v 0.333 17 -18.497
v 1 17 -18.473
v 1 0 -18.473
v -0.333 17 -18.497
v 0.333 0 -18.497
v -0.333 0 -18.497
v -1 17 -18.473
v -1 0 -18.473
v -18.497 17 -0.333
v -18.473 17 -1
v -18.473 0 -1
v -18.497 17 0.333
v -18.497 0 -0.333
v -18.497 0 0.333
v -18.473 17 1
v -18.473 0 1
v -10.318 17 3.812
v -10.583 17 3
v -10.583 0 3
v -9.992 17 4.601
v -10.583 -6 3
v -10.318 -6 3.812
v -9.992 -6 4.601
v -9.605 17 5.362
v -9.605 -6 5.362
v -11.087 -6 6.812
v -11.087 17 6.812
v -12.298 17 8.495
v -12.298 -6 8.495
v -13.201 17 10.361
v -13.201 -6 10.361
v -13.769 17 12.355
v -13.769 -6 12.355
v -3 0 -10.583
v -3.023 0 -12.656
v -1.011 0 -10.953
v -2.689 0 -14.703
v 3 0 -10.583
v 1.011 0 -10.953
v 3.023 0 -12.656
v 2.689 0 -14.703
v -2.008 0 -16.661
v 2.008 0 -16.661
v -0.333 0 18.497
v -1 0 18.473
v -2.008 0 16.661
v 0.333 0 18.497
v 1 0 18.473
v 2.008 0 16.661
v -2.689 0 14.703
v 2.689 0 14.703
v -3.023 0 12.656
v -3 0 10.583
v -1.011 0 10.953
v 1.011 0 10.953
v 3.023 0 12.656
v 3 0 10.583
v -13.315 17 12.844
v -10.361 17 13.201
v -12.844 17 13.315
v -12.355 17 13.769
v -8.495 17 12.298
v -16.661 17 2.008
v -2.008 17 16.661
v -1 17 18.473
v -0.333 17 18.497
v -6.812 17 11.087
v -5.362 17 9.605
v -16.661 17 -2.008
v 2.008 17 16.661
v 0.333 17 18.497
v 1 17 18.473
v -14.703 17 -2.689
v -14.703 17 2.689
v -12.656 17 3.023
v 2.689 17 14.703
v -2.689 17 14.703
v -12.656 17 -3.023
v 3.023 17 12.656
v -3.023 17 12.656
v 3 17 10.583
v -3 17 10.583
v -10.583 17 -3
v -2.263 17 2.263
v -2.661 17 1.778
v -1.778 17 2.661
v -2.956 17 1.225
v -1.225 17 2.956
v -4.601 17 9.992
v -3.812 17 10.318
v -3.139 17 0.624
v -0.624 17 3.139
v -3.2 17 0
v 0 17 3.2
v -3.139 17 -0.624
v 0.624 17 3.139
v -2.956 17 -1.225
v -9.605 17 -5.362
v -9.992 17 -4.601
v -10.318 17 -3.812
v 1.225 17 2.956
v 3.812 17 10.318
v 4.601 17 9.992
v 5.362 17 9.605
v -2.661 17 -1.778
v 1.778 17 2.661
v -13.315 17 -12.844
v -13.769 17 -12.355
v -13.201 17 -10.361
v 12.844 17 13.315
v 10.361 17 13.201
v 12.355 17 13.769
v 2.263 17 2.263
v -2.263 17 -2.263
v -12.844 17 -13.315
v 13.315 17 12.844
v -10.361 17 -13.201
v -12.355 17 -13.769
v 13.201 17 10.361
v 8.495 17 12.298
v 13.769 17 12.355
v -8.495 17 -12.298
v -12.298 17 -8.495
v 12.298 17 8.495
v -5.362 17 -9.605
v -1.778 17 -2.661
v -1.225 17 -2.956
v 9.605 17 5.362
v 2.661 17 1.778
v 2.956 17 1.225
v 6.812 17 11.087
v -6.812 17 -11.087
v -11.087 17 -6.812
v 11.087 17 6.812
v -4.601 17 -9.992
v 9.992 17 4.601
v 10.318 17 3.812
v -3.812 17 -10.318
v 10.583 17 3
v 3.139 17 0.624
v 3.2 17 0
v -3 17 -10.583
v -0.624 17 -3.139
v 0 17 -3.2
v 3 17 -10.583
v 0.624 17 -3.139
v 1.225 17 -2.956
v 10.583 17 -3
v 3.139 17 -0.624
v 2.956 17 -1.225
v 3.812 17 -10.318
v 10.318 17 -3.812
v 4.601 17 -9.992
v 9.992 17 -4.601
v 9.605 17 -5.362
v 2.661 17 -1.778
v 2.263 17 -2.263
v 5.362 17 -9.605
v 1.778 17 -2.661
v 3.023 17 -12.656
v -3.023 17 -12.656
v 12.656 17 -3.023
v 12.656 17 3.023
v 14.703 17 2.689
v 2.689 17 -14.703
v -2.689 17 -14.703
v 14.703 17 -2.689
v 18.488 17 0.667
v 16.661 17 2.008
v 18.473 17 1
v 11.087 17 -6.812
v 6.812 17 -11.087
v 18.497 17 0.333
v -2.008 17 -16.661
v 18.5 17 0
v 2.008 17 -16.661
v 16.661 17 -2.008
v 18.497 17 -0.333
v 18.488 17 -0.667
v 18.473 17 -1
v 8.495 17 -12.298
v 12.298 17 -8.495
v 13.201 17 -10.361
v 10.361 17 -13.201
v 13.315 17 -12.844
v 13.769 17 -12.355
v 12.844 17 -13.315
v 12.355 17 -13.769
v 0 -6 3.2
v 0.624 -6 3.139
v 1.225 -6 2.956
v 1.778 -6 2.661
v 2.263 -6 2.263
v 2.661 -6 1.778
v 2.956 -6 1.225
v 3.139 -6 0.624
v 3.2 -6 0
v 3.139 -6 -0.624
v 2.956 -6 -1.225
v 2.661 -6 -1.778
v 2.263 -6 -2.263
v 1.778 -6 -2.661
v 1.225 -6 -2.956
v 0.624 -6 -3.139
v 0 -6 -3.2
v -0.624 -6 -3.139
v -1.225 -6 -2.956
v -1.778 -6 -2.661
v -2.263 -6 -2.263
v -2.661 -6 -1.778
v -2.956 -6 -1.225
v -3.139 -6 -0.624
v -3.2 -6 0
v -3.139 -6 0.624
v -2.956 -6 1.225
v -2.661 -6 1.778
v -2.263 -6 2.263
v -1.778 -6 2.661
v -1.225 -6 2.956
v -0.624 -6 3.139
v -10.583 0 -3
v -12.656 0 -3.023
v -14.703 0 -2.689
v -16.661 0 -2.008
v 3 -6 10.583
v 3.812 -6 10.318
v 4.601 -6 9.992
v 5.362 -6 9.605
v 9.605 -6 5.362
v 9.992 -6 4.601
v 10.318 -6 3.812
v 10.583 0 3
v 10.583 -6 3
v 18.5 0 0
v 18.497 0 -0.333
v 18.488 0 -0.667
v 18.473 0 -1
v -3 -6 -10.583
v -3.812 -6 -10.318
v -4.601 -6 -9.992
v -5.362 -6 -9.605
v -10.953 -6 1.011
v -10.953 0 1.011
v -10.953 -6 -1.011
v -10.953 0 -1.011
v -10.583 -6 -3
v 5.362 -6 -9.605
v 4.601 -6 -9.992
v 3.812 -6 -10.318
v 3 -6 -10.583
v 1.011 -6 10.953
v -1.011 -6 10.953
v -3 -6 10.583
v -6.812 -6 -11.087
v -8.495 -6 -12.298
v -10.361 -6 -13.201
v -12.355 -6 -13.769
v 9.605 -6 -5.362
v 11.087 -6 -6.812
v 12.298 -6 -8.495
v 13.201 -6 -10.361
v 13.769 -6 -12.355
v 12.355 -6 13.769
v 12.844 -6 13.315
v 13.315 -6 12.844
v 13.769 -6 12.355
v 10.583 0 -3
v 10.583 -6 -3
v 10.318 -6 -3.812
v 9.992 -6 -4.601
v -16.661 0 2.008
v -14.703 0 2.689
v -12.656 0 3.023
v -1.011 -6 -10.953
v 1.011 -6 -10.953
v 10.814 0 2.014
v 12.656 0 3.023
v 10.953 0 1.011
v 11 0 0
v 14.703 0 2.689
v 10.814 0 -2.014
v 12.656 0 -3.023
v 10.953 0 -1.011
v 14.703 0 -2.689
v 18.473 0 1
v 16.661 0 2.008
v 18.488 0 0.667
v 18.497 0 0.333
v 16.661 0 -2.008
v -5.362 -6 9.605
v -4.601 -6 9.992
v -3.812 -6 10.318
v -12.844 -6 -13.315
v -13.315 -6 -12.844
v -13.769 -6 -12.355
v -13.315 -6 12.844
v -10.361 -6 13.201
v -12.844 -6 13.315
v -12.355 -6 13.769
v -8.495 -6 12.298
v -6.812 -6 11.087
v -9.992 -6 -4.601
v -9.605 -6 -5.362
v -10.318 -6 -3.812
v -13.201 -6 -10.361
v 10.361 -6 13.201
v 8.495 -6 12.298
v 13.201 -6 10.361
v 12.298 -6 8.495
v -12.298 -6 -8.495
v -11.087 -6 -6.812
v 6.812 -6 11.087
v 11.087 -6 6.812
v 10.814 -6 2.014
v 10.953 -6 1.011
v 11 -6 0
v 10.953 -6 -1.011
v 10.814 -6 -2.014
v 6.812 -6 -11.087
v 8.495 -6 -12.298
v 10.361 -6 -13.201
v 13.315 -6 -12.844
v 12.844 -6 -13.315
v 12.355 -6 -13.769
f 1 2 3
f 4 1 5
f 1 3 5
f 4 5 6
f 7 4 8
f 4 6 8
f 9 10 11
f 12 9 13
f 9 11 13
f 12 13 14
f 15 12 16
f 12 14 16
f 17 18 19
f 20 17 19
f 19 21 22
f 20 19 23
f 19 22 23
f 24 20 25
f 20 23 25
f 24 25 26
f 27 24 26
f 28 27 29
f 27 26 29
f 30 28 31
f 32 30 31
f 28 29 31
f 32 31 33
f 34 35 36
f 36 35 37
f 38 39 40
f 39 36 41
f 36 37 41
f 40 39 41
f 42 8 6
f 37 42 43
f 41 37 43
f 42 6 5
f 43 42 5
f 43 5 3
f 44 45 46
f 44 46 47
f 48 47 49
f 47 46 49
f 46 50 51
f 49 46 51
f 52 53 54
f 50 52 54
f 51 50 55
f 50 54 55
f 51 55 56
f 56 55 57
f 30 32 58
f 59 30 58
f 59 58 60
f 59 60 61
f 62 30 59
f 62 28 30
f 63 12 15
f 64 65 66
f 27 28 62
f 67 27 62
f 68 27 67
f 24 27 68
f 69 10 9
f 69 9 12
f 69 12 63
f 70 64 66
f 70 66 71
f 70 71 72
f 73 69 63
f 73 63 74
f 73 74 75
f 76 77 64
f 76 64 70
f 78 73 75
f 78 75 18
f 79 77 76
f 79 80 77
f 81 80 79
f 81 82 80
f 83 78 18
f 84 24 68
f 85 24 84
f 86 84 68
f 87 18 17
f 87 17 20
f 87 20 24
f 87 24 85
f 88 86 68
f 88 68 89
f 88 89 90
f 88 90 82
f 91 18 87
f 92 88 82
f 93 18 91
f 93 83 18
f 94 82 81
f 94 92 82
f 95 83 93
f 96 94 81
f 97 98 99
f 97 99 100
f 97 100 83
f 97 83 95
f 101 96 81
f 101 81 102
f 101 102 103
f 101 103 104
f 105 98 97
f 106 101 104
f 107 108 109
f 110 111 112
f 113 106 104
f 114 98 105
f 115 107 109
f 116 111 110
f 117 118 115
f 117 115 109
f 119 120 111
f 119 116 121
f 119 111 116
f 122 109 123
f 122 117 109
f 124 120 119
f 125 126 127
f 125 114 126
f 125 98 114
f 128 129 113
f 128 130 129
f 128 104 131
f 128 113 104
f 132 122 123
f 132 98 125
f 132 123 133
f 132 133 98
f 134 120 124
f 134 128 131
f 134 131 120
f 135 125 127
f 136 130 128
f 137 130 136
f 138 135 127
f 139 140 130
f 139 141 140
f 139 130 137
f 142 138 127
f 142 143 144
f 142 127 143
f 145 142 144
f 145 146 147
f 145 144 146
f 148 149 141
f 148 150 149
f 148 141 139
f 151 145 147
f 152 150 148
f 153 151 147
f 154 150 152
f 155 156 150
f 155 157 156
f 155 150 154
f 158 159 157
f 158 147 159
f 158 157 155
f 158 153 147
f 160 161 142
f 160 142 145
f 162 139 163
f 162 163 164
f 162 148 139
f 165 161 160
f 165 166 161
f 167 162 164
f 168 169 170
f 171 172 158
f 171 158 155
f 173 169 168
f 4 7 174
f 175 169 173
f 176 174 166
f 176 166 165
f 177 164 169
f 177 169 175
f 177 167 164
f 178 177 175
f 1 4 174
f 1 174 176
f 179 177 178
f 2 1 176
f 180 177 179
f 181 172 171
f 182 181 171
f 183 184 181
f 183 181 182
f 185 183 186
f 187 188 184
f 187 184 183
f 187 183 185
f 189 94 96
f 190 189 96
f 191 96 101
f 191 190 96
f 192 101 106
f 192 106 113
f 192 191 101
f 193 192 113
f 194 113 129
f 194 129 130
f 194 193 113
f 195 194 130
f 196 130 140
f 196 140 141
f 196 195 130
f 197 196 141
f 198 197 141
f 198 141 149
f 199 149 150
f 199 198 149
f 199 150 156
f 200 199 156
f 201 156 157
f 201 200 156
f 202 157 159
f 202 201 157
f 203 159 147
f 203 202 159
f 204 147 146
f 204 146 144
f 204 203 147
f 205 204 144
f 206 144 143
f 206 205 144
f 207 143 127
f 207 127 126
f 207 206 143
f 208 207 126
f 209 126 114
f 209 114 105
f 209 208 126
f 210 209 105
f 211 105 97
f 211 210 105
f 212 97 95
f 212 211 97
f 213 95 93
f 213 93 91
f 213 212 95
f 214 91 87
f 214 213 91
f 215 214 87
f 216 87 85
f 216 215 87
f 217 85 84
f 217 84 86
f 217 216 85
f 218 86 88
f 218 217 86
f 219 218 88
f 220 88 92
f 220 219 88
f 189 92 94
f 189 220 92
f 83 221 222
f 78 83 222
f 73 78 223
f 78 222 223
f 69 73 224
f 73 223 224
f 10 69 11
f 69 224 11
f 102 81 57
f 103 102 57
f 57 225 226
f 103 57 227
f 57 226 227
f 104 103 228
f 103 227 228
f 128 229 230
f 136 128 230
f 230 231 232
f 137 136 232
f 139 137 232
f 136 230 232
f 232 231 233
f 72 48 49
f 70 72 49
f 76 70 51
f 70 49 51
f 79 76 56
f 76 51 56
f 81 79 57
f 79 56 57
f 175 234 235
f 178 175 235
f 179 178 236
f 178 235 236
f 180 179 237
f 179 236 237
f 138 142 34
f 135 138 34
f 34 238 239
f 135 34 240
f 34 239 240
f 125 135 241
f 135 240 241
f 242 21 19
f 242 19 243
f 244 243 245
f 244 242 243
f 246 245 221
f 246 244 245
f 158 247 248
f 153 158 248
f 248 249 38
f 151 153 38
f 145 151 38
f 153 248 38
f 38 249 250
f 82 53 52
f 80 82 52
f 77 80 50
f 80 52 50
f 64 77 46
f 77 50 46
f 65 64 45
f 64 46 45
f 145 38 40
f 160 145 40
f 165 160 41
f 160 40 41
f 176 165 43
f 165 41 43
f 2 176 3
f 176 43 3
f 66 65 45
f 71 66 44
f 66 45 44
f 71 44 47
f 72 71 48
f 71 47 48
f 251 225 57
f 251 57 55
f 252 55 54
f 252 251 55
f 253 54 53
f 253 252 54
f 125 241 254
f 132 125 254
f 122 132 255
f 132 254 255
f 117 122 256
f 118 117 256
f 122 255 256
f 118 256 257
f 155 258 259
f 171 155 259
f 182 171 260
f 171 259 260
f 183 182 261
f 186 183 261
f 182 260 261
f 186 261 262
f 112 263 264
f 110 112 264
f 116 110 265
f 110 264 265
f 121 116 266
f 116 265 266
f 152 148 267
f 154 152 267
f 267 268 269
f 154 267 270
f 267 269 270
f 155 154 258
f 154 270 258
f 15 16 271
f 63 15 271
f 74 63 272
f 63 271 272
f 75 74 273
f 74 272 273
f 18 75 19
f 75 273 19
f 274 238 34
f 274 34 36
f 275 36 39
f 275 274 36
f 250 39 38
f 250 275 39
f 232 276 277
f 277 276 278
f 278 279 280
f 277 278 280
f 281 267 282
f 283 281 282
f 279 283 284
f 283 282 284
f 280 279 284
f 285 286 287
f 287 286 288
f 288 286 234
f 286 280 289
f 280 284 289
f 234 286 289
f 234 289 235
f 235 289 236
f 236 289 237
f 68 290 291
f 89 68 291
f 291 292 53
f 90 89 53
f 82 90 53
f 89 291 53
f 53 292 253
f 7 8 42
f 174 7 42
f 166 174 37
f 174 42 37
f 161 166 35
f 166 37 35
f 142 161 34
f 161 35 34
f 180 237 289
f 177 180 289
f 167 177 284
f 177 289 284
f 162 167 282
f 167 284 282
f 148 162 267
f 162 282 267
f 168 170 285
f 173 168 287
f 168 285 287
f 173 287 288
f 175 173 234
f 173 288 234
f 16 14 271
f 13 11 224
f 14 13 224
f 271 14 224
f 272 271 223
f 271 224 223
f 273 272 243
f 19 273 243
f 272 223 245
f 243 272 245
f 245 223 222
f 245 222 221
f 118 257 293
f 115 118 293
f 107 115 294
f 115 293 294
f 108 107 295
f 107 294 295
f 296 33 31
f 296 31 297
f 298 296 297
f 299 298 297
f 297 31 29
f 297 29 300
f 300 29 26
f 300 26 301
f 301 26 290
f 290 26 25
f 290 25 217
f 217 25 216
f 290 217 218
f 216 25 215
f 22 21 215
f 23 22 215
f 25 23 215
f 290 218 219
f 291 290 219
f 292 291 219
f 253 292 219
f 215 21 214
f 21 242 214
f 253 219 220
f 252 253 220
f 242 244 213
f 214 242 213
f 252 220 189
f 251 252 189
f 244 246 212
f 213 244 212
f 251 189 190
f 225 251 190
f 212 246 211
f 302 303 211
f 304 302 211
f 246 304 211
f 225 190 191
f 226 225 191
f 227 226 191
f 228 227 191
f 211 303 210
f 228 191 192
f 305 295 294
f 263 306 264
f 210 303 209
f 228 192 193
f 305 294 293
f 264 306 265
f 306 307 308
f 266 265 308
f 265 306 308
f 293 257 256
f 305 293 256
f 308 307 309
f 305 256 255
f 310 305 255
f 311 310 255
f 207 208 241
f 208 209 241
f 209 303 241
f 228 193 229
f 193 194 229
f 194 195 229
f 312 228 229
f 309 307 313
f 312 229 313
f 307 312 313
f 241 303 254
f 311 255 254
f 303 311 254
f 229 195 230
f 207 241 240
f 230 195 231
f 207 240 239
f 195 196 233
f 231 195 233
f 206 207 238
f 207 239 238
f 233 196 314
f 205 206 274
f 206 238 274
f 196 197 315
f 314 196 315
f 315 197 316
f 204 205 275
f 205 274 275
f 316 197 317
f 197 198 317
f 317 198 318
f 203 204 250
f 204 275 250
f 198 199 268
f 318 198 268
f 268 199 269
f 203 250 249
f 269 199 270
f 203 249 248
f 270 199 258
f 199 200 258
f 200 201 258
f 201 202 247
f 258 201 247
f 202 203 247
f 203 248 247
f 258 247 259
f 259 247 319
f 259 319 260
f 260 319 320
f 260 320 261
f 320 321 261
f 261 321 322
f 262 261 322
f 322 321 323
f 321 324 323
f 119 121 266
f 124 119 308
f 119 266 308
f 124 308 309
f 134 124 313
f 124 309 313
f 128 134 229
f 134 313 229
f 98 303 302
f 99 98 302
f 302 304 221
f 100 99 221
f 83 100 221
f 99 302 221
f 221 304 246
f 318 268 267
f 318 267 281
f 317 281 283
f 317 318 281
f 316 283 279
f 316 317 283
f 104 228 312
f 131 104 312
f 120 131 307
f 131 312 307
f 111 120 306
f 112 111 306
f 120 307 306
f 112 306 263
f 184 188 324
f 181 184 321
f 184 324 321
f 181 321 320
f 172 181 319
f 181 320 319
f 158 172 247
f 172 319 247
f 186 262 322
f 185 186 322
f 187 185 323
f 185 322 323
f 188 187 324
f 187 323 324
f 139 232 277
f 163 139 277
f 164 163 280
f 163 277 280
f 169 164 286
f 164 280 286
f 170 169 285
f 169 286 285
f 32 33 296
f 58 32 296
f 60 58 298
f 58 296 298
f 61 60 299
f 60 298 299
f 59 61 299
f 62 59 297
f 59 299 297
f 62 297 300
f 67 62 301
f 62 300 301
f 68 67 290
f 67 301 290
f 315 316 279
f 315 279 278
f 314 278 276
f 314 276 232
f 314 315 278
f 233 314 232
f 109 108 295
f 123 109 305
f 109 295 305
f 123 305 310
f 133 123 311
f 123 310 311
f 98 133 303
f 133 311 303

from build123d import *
from build123d.topology import SkipClean

# Parameters (mm, degrees)
BOSS_EXTRUDE1_DEPTH      = 17
BOSS_EXTRUDE1_DEPTH_BACK = 6
SKETCH1_R                = 3.2
CUT_EXTRUDE1_START       = -10
CUT_EXTRUDE1_DEPTH       = 10


with BuildPart() as part:
    # Sketch1 → Boss-Extrude1 (new, two sides: drawn at the far end of the back side and taken through both)
    with BuildSketch(Plane(origin=(0, 0, 0), x_dir=(1, 0, 0), z_dir=(0, 1, 0)).offset(-BOSS_EXTRUDE1_DEPTH_BACK)):
        with BuildLine():
            ThreePointArc((18.472953202, -1), (18.5, 0), (18.472953202, 1))
            ThreePointArc((18.472953202, 1), (14.702730308, 2.689388484), (10.583005244, 3))
            ThreePointArc((10.583005244, 3), (10.162674858, 4.209517756), (9.604635117, 5.36199443))
            ThreePointArc((9.604635117, 5.36199443), (12.298085137, 8.494715469), (13.769457259, 12.355243696))
            ThreePointArc((13.769457259, 12.355243696), (13.081475452, 13.081475452), (12.355243696, 13.769457259))
            ThreePointArc((12.355243696, 13.769457259), (8.494715469, 12.298085137), (5.36199443, 9.604635117))
            ThreePointArc((5.36199443, 9.604635117), (4.209517756, 10.162674858), (3, 10.583005244))
            ThreePointArc((3, 10.583005244), (2.689388484, 14.702730308), (1, 18.472953202))
            ThreePointArc((1, 18.472953202), (0, 18.5), (-1, 18.472953202))
            ThreePointArc((-1, 18.472953202), (-2.689388484, 14.702730308), (-3, 10.583005244))
            ThreePointArc((-3, 10.583005244), (-4.209517756, 10.162674858), (-5.36199443, 9.604635117))
            ThreePointArc((-5.36199443, 9.604635117), (-8.494715469, 12.298085137), (-12.355243696, 13.769457259))
            ThreePointArc((-12.355243696, 13.769457259), (-13.081475452, 13.081475452), (-13.769457259, 12.355243696))
            ThreePointArc((-13.769457259, 12.355243696), (-12.298085137, 8.494715469), (-9.604635117, 5.36199443))
            ThreePointArc((-9.604635117, 5.36199443), (-10.162674858, 4.209517756), (-10.583005244, 3))
            ThreePointArc((-10.583005244, 3), (-14.702730308, 2.689388484), (-18.472953202, 1))
            ThreePointArc((-18.472953202, 1), (-18.5, 0), (-18.472953202, -1))
            ThreePointArc((-18.472953202, -1), (-14.702730308, -2.689388484), (-10.583005244, -3))
            ThreePointArc((-10.583005244, -3), (-10.162674858, -4.209517756), (-9.604635117, -5.36199443))
            ThreePointArc((-9.604635117, -5.36199443), (-12.298085137, -8.494715469), (-13.769457259, -12.355243696))
            ThreePointArc((-13.769457259, -12.355243696), (-13.081475452, -13.081475452), (-12.355243696, -13.769457259))
            ThreePointArc((-12.355243696, -13.769457259), (-8.494715469, -12.298085137), (-5.36199443, -9.604635117))
            ThreePointArc((-5.36199443, -9.604635117), (-4.209517756, -10.162674858), (-3, -10.583005244))
            ThreePointArc((-3, -10.583005244), (-2.689388484, -14.702730308), (-1, -18.472953202))
            ThreePointArc((-1, -18.472953202), (0, -18.5), (1, -18.472953202))
            ThreePointArc((1, -18.472953202), (2.689388484, -14.702730308), (3, -10.583005244))
            ThreePointArc((3, -10.583005244), (4.209517756, -10.162674858), (5.36199443, -9.604635117))
            ThreePointArc((5.36199443, -9.604635117), (8.494715469, -12.298085137), (12.355243696, -13.769457259))
            ThreePointArc((12.355243696, -13.769457259), (13.081475452, -13.081475452), (13.769457259, -12.355243696))
            ThreePointArc((13.769457259, -12.355243696), (12.298085137, -8.494715469), (9.604635117, -5.36199443))
            ThreePointArc((9.604635117, -5.36199443), (10.162674858, -4.209517756), (10.583005244, -3))
            ThreePointArc((10.583005244, -3), (14.702730308, -2.689388484), (18.472953202, -1))
        make_face()
        Circle(SKETCH1_R, mode=Mode.SUBTRACT)
    extrude(amount=BOSS_EXTRUDE1_DEPTH + BOSS_EXTRUDE1_DEPTH_BACK)

    # Sketch1<7> → Cut-Extrude1 (cut)
    with SkipClean():  # the faces are left unmerged after this step: merging them gives an invalid solid
        with BuildSketch(Plane(origin=(0, 0, 0), x_dir=(1, 0, 0), z_dir=(0, 1, 0)).offset(CUT_EXTRUDE1_START)):
            with BuildLine():
                ThreePointArc((18.472953202, -1), (18.5, 0), (18.472953202, 1))
                ThreePointArc((18.472953202, 1), (14.702730308, 2.689388484), (10.583005244, 3))
                ThreePointArc((10.583005244, 3), (11, 0), (10.583005244, -3))
                ThreePointArc((10.583005244, -3), (14.702730308, -2.689388484), (18.472953202, -1))
            make_face()
            with BuildLine():
                ThreePointArc((3, 10.583005244), (2.689388484, 14.702730308), (1, 18.472953202))
                ThreePointArc((1, 18.472953202), (0, 18.5), (-1, 18.472953202))
                ThreePointArc((-1, 18.472953202), (-2.689388484, 14.702730308), (-3, 10.583005244))
                ThreePointArc((-3, 10.583005244), (0, 11), (3, 10.583005244))
            make_face()
            with BuildLine():
                ThreePointArc((-1, -18.472953202), (0, -18.5), (1, -18.472953202))
                ThreePointArc((1, -18.472953202), (2.689388484, -14.702730308), (3, -10.583005244))
                ThreePointArc((3, -10.583005244), (0, -11), (-3, -10.583005244))
                ThreePointArc((-3, -10.583005244), (-2.689388484, -14.702730308), (-1, -18.472953202))
            make_face()
            with BuildLine():
                ThreePointArc((-10.583005244, 3), (-14.702730308, 2.689388484), (-18.472953202, 1))
                ThreePointArc((-18.472953202, 1), (-18.5, 0), (-18.472953202, -1))
                ThreePointArc((-18.472953202, -1), (-14.702730308, -2.689388484), (-10.583005244, -3))
                ThreePointArc((-10.583005244, -3), (-11, 0), (-10.583005244, 3))
            make_face()
        extrude(amount=CUT_EXTRUDE1_DEPTH, mode=Mode.SUBTRACT)


solid = part.part
